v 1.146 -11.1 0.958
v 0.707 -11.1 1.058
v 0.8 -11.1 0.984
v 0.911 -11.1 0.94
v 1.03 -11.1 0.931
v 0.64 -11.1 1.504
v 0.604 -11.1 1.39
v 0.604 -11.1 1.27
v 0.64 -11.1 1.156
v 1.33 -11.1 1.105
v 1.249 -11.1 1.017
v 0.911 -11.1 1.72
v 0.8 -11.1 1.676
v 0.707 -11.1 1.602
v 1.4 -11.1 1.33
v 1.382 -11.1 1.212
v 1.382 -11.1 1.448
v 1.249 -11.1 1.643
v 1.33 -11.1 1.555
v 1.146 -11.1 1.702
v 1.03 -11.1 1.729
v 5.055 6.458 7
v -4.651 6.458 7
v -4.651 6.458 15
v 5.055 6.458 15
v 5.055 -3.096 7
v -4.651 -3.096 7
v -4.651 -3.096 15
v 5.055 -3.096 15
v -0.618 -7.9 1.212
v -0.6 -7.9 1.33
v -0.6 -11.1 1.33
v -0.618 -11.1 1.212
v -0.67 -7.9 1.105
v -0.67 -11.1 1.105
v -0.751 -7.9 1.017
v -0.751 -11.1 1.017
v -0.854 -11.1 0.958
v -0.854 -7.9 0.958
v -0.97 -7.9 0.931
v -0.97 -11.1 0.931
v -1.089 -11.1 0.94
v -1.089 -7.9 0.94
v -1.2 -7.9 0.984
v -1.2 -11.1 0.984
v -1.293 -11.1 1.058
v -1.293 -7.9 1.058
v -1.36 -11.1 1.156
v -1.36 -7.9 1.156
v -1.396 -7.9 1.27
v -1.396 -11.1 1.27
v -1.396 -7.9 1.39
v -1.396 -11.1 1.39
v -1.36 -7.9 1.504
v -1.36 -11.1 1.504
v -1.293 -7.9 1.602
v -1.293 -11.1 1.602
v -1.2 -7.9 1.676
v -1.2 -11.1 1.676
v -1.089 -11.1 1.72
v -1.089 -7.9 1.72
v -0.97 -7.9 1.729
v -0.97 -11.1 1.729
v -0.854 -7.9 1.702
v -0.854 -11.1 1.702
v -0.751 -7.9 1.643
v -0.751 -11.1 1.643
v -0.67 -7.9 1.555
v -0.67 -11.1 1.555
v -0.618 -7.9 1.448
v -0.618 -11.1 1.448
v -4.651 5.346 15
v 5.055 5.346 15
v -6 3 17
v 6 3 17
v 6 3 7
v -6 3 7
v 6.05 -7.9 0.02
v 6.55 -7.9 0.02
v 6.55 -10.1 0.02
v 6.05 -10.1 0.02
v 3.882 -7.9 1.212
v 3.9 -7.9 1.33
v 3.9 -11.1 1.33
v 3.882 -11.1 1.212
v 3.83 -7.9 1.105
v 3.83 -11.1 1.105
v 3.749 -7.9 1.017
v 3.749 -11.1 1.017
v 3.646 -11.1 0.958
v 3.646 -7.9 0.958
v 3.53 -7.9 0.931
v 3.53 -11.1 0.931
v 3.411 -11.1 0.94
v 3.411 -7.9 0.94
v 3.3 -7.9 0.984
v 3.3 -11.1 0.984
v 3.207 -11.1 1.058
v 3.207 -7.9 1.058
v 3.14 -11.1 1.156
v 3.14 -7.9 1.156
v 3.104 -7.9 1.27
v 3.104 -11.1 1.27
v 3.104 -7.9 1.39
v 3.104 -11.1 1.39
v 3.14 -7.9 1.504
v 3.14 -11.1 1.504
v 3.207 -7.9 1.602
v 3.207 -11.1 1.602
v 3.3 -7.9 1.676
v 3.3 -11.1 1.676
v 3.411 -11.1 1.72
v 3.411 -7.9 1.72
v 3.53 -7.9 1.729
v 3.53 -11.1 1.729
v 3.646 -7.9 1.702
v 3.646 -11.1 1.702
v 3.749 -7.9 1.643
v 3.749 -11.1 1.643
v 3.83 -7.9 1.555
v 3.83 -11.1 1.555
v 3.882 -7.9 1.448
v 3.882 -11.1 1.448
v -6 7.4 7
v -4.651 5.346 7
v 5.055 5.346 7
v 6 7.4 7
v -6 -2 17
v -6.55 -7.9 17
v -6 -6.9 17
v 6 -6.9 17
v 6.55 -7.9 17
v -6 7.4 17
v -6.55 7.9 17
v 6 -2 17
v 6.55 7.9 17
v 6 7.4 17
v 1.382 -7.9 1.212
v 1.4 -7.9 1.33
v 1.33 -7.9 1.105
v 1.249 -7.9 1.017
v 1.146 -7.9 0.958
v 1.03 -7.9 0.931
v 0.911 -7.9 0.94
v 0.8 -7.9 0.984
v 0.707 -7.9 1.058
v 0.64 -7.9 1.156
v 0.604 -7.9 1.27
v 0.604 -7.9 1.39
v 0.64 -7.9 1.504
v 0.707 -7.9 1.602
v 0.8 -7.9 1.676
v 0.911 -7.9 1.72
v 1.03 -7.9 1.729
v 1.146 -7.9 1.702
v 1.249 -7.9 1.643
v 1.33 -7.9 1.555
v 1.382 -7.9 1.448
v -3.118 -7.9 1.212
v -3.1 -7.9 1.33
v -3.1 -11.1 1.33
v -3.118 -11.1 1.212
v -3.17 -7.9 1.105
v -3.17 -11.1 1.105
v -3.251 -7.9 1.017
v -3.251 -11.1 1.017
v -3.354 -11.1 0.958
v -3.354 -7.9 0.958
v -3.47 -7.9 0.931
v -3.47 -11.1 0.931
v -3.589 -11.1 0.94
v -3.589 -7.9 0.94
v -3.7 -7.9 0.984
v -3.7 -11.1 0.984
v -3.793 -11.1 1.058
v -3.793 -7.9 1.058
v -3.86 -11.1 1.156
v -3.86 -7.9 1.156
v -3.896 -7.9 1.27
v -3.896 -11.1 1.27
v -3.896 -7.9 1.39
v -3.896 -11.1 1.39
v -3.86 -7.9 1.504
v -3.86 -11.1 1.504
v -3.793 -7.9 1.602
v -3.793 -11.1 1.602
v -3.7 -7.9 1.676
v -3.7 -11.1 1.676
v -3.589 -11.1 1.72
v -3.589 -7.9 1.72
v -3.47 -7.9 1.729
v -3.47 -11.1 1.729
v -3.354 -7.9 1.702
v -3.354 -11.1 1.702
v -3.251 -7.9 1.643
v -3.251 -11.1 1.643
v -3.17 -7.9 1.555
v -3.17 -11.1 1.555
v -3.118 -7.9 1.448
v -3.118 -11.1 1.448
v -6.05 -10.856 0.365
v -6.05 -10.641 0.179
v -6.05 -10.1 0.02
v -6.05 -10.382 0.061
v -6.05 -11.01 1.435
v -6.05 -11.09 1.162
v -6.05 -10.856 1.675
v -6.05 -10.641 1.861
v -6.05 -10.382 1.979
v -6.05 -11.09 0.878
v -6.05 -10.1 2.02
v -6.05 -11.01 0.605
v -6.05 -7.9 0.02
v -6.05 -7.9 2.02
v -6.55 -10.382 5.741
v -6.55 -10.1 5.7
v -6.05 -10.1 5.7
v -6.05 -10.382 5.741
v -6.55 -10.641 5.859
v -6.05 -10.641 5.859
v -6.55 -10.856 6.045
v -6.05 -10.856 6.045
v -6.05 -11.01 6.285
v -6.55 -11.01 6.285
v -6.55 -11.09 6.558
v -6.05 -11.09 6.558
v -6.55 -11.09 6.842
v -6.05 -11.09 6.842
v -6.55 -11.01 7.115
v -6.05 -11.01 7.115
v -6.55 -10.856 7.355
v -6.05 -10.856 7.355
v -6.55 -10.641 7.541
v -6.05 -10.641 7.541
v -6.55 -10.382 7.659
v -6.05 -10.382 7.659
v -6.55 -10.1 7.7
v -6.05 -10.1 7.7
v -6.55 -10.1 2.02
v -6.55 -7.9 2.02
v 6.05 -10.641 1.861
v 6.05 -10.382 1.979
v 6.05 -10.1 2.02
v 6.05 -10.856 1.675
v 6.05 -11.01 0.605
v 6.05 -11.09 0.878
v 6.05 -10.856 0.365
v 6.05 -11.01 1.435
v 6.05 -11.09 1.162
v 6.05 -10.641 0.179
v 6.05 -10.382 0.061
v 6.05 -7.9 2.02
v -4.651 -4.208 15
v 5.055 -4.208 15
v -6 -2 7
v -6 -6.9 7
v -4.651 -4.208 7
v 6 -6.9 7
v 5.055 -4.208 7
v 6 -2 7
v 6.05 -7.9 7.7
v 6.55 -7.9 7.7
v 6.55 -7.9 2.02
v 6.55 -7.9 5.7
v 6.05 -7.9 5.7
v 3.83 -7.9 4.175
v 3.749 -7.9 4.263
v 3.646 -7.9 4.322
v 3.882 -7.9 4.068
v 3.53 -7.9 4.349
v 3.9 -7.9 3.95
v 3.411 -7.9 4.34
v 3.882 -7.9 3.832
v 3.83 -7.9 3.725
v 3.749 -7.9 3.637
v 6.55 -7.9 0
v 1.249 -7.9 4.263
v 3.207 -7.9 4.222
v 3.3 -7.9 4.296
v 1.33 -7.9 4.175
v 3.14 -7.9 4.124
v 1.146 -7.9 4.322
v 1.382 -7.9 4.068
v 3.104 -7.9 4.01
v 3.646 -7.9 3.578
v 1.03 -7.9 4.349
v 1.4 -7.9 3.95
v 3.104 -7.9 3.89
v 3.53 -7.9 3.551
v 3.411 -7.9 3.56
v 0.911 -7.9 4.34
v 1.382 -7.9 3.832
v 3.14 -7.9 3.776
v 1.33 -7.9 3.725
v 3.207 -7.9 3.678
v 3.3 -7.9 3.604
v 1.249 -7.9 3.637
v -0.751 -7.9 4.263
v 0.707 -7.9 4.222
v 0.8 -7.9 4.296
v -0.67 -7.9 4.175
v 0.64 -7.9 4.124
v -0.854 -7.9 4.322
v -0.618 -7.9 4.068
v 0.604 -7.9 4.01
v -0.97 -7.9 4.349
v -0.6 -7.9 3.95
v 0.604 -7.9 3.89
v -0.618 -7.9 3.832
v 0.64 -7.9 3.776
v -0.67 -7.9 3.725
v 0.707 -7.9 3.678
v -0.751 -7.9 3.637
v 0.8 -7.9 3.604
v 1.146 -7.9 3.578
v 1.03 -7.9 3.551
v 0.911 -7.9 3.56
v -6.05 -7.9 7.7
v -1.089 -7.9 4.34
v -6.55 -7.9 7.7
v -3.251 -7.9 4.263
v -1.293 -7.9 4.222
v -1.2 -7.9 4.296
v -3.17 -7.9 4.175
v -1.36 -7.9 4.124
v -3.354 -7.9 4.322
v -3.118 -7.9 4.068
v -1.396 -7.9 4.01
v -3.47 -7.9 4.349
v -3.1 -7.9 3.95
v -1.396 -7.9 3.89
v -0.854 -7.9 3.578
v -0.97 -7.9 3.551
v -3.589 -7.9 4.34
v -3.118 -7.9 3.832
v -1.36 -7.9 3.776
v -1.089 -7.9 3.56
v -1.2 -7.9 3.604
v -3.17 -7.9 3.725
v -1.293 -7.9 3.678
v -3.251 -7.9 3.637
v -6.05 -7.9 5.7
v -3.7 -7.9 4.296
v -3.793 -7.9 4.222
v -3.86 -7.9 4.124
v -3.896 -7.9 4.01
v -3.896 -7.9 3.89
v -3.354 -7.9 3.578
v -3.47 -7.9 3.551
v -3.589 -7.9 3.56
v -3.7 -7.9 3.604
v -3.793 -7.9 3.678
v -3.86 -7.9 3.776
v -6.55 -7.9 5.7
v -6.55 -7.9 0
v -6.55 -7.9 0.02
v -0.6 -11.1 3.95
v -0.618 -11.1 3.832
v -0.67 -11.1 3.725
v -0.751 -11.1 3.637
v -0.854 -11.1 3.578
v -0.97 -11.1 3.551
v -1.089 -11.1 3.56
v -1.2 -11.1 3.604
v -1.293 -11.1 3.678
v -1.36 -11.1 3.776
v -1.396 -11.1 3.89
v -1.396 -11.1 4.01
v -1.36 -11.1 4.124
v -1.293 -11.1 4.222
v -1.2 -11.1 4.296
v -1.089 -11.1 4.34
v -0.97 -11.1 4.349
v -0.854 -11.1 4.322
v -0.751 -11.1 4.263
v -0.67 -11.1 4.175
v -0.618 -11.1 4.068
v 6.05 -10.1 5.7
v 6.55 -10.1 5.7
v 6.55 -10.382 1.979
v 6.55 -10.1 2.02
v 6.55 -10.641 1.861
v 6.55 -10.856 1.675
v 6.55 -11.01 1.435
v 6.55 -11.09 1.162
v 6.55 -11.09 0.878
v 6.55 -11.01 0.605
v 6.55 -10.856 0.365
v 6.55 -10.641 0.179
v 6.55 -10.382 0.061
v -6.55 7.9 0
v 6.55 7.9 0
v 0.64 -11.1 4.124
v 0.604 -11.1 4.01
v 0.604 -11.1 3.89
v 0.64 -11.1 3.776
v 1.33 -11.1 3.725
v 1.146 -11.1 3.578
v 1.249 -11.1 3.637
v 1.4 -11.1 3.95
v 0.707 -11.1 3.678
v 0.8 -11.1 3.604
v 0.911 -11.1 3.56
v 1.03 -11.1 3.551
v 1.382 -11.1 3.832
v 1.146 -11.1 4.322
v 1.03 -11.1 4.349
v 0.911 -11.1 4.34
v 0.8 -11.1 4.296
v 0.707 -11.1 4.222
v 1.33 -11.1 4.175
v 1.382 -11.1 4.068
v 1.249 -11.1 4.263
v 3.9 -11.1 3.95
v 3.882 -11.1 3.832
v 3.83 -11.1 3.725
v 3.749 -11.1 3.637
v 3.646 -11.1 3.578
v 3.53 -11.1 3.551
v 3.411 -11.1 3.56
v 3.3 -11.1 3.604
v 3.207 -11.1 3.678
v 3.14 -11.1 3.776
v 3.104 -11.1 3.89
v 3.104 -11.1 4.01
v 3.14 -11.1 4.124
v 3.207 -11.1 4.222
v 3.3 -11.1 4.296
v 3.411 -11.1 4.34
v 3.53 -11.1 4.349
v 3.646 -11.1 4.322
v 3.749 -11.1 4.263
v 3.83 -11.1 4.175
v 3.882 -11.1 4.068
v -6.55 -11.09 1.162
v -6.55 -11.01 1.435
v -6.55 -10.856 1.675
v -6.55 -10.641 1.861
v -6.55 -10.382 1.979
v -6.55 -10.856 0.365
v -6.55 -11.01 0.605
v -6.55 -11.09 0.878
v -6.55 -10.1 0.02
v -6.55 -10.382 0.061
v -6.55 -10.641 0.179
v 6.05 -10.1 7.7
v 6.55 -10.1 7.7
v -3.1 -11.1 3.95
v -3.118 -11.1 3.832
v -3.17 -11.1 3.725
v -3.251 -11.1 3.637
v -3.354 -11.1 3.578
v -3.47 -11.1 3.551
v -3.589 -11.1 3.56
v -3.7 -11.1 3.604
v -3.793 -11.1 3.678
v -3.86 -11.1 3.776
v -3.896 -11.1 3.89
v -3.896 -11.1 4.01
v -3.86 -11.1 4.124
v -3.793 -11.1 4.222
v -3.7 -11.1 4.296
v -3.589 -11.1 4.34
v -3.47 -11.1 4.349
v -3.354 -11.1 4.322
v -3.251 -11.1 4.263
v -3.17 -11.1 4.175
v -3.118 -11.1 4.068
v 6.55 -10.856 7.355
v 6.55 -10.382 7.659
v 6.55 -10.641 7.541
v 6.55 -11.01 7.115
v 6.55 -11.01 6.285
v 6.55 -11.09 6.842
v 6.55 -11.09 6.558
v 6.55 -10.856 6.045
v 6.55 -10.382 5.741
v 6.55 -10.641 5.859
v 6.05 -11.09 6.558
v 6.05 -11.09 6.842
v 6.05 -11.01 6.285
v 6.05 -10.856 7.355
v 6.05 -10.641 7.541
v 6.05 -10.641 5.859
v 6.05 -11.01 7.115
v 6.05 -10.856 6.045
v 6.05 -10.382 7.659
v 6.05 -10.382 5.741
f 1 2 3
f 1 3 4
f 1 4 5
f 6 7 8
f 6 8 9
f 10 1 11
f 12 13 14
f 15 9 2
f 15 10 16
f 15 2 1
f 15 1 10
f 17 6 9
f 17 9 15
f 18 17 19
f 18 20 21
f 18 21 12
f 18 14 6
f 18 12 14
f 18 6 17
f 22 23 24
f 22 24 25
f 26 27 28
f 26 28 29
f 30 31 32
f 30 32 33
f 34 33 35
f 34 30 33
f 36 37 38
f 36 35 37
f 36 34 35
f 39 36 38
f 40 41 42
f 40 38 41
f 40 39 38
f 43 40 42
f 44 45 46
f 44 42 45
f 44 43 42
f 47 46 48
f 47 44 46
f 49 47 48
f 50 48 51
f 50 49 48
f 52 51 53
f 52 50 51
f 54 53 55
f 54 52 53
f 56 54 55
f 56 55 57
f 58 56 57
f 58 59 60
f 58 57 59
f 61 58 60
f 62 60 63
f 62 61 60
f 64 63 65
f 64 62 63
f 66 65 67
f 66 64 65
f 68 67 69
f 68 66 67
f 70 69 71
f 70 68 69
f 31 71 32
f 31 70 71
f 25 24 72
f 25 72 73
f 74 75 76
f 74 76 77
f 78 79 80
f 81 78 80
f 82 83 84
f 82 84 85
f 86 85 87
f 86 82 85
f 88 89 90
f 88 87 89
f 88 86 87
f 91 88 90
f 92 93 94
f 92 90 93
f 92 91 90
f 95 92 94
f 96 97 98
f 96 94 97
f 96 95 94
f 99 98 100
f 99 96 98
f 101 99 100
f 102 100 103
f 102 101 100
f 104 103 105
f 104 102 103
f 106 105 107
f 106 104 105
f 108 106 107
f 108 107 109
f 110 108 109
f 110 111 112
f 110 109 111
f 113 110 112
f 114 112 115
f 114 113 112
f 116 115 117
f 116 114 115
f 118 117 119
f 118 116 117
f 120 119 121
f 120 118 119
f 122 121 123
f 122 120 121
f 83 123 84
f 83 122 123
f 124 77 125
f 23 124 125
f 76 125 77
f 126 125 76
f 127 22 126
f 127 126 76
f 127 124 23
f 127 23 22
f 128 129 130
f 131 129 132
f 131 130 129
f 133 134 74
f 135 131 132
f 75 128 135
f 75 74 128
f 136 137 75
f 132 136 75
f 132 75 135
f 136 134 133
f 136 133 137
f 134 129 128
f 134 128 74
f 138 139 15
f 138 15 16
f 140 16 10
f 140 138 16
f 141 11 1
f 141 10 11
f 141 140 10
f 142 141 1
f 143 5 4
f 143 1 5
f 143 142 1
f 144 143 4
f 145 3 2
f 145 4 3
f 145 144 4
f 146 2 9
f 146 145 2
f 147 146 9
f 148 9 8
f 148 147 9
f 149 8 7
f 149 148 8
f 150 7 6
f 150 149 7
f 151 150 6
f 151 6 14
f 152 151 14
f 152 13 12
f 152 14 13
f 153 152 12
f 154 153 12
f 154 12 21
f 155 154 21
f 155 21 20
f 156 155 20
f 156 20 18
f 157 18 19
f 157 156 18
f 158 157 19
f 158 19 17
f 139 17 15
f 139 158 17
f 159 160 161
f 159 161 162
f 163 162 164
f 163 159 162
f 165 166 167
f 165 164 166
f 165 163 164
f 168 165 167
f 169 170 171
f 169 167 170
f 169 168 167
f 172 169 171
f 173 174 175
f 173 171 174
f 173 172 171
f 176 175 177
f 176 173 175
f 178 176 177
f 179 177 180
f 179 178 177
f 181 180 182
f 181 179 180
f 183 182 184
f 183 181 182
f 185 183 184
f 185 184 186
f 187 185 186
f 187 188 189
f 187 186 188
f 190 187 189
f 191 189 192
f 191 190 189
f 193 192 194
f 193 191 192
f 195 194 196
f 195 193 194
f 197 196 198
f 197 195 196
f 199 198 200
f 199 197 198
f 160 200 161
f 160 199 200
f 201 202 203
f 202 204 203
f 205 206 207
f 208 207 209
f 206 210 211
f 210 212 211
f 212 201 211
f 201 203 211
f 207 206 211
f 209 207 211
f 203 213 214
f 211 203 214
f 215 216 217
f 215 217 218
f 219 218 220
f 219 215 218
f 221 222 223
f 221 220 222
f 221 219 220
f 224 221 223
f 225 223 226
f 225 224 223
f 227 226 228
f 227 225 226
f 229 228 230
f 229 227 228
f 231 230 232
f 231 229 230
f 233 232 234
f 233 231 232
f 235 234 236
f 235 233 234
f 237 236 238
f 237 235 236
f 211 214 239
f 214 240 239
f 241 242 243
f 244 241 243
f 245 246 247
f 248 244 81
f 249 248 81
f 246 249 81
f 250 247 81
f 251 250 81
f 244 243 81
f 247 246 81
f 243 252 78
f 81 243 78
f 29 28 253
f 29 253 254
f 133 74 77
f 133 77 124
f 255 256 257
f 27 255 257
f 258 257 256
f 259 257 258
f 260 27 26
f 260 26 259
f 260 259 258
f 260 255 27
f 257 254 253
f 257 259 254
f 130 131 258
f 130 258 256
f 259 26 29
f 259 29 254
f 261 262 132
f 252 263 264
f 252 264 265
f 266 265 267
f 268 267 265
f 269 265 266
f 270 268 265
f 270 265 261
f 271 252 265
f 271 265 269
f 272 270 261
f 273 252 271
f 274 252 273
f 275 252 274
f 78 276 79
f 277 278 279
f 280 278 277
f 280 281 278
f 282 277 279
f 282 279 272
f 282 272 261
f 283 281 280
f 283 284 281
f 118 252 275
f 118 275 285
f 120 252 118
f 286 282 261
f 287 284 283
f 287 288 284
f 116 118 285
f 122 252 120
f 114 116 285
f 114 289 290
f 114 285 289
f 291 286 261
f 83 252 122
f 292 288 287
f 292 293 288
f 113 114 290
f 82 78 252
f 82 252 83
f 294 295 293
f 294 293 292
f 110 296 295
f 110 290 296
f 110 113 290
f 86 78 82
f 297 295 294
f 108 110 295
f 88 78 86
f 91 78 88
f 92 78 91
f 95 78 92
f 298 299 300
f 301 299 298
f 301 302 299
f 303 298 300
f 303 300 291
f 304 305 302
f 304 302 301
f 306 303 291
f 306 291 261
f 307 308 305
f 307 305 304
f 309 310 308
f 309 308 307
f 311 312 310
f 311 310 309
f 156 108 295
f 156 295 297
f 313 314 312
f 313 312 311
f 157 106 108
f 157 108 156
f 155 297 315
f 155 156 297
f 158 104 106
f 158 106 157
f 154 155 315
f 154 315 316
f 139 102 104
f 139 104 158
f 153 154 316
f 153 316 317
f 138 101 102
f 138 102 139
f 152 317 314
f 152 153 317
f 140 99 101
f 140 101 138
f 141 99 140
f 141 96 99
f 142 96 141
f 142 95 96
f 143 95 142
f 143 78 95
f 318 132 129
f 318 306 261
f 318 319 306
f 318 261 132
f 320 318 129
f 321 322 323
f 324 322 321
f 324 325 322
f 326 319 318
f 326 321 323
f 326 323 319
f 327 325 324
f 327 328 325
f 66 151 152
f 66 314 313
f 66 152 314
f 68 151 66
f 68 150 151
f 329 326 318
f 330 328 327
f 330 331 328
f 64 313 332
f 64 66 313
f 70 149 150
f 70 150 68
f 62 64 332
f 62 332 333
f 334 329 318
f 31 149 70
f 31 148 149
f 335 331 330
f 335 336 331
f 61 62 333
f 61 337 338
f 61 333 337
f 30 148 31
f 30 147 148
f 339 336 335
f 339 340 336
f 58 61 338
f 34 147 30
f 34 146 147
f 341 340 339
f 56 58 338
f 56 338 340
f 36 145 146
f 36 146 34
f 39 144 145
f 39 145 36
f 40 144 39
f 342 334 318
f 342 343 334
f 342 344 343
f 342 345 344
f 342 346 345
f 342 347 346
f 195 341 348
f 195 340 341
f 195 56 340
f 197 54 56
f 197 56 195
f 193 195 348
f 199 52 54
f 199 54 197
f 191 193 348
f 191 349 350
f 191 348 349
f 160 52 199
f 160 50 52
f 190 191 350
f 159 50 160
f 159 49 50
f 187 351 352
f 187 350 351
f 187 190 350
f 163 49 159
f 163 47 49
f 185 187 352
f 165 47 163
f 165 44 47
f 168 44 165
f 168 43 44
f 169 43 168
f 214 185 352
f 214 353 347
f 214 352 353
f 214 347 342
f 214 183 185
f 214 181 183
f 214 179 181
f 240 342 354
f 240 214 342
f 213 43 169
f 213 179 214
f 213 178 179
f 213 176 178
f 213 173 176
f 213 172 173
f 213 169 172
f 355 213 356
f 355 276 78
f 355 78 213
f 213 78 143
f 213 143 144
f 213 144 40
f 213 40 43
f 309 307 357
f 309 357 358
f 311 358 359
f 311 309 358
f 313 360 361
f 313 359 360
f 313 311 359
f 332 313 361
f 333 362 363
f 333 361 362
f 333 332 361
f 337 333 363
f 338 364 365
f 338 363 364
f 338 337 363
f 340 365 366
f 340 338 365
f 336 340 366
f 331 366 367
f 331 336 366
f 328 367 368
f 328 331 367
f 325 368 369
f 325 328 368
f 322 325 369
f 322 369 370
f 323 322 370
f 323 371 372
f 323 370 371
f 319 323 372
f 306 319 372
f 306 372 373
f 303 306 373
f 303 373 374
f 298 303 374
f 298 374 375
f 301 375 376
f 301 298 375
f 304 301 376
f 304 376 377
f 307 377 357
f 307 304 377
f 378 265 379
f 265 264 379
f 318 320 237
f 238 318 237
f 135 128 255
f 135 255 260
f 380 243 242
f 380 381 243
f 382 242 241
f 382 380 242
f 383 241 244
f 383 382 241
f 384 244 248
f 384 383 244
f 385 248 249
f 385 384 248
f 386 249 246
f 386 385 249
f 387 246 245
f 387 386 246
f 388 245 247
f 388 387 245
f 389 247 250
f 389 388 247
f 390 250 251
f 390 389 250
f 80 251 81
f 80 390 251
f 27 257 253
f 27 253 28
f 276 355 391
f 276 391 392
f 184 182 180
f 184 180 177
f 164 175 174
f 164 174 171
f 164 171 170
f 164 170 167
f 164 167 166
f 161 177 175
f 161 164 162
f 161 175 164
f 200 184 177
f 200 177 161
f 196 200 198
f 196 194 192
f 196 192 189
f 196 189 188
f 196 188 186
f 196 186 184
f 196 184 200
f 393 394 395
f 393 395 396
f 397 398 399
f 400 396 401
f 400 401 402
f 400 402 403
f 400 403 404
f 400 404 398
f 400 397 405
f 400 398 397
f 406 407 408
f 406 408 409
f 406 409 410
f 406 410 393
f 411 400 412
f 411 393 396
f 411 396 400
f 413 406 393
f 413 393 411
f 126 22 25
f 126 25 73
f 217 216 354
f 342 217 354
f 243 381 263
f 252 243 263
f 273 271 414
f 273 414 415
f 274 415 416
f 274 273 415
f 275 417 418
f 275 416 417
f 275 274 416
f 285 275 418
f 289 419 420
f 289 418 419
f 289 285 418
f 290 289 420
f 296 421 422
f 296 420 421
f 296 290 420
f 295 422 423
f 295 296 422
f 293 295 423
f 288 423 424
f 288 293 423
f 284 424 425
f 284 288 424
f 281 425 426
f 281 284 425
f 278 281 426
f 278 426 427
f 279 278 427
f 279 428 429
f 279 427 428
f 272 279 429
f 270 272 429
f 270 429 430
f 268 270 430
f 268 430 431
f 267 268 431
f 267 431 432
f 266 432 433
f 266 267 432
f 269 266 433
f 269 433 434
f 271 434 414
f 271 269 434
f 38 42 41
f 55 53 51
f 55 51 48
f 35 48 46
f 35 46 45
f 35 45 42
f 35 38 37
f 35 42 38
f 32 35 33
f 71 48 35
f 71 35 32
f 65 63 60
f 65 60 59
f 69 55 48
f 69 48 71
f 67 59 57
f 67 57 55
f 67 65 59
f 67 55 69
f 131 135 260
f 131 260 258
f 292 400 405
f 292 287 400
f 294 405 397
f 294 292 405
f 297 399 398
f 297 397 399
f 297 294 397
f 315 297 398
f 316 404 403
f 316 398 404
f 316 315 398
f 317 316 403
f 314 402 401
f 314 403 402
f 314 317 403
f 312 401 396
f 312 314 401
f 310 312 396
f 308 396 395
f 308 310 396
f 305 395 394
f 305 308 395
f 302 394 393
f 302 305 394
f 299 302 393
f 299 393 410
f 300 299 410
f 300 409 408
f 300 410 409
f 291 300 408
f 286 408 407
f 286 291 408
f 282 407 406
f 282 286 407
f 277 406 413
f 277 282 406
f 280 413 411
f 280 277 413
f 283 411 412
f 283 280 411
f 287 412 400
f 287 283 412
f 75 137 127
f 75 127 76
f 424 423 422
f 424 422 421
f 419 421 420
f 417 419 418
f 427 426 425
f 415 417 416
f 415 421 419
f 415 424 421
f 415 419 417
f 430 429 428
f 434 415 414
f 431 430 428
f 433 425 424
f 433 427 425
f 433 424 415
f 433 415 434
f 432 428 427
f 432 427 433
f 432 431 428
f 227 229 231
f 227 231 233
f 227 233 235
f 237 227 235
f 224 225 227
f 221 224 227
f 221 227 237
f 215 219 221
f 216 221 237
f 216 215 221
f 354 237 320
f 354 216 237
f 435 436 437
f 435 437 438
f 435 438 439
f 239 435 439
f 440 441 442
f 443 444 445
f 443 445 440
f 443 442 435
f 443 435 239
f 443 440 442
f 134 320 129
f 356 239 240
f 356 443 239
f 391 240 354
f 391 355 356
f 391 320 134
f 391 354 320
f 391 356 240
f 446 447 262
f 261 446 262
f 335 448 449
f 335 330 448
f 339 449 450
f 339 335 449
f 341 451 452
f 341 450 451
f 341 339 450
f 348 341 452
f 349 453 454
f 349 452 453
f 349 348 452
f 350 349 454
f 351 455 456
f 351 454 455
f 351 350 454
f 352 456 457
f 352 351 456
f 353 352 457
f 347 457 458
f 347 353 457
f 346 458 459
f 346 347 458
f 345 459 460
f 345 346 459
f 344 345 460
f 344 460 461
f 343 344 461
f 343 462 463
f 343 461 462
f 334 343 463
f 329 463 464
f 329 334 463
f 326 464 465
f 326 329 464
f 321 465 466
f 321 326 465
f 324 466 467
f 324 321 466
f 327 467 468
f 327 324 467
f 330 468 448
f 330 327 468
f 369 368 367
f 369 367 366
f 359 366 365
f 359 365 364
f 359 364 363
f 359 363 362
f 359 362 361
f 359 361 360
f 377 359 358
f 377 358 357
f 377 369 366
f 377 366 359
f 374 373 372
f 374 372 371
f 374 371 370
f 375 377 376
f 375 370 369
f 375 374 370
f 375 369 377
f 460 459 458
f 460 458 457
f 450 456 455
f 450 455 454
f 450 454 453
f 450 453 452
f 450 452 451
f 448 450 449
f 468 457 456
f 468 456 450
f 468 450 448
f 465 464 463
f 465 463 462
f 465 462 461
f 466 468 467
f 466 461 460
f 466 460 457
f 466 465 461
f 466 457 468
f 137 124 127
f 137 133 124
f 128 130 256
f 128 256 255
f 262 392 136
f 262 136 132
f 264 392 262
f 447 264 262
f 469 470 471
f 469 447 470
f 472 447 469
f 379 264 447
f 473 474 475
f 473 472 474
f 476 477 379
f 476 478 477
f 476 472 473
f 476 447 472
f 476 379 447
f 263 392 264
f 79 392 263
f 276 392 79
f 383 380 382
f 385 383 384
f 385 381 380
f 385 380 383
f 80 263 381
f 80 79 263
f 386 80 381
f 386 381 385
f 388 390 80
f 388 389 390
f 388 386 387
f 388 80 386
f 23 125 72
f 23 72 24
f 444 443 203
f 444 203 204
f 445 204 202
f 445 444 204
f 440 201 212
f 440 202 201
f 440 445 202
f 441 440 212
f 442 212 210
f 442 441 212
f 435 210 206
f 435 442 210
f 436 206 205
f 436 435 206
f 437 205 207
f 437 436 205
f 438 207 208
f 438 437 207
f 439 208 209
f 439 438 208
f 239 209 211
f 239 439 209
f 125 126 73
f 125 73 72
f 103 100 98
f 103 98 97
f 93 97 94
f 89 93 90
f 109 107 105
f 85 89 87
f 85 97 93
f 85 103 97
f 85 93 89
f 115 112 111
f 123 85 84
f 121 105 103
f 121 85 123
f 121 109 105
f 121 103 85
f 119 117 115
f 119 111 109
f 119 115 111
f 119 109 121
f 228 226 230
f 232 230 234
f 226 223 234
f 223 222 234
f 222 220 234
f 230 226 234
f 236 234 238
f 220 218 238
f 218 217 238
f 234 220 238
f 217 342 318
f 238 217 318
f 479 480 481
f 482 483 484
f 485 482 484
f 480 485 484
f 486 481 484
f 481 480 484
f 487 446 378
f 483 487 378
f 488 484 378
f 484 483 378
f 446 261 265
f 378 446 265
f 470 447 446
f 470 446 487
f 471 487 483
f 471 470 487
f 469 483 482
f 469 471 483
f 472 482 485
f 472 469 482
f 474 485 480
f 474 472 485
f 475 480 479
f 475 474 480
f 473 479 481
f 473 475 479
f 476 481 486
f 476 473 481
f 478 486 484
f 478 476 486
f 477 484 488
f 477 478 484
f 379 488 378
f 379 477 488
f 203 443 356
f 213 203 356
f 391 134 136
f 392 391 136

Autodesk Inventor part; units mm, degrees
ref_plane "YZ Plane" through (0, 0, 0) normal (1, 0, 0) x (0, 1, 0)
ref_plane "XZ Plane" through (0, 0, 0) normal (0, 1, 0) x (-1, 0, 0)
ref_plane "XY Plane" through (0, 0, 0) normal (0, 0, 1) x (1, 0, 0)
sketch "Sketch1" plane through (0, 0, 0) normal (0, 0, 1) x (1, 0, 0)
  line L0 (-6.55, 7.9) -> (6.55, 7.9)
  line L1 (6.55, 7.9) -> (6.55, -7.9)
  line L2 (6.55, -7.9) -> (-6.55, -7.9)
  line L3 (-6.55, -7.9) -> (-6.55, 7.9)
  point P0 (0, 0)
  dimension "d0" = 13.1
  dimension "d1" = 15.8
  dimension "d2" = 7.9
  dimension "d3" = 6.55
extrude "Extrusion1" add sketch "Sketch1" along normal blind 17
sketch "Sketch2" plane through (0, 0, 17) normal (0, 0, 1) x (1, 0, 0)
  line L0 (-6, 7.4) -> (6, 7.4)
  line L1 (6, 7.4) -> (6, 3)
  line L2 (6, 3) -> (-6, 3)
  line L3 (-6, 3) -> (-6, 7.4)
  line L4 (-6, -2) -> (6, -2)
  line L5 (6, -2) -> (6, -6.9)
  line L6 (6, -6.9) -> (-6, -6.9)
  line L7 (-6, -6.9) -> (-6, -2)
  line L8 (-6.55, -7.9) -> (6.55, -7.9) projected
  line L9 (6.55, 7.9) -> (-6.55, 7.9) projected
  point P0 (0, 0)
  dimension "d6" = 12
  dimension "d7" = 12
  dimension "d8" = 6
  dimension "d9" = 1
  dimension "d10" = 0.5
  dimension "d11" = 5
  dimension "d12" = 2
extrude "Extrusion2" cut sketch "Sketch2" against normal blind 10
sketch "Sketch3" plane through (0, 0, 7) normal (0, 0, 1) x (1, 0, 0)
  line L0 (-4.6506, 6.4578) -> (5.055, 6.4578)
  line L1 (5.055, 6.4578) -> (5.055, 5.3457)
  line L2 (5.055, 5.3457) -> (-4.6506, 5.3457)
  line L3 (-4.6506, 5.3457) -> (-4.6506, 6.4578)
  line L4 (-4.6506, -3.0962) -> (5.055, -3.0962)
  line L5 (5.055, -3.0962) -> (5.055, -4.2083)
  line L6 (5.055, -4.2083) -> (-4.6506, -4.2083)
  line L7 (-4.6506, -4.2083) -> (-4.6506, -3.0962)
  point P0 (0, 0)
extrude "Extrusion3" add sketch "Sketch3" along normal blind 8
sketch "Sketch4" plane through (6.55, -7.9, 0) normal (1, 0, 0) x (0, 0, -1)
  line L0 (-7.7, 2.838) -> (-5.7, 2.838)
  line L1 (-5.7, 2.838) -> (-5.7, -3.2)
  line L2 (-5.7, -3.2) -> (-7.7, -3.2)
  line L3 (-7.7, -3.2) -> (-7.7, 2.838)
  line L4 (-17, 0) -> (-17, 15.8) projected
  line L5 (-2.02, 6.1684) -> (-0.02, 6.1684)
  line L6 (-0.02, 6.1684) -> (-0.02, -3.2)
  line L7 (-0.02, -3.2) -> (-2.02, -3.2)
  line L8 (-2.02, -3.2) -> (-2.02, 6.1684)
  arc A0 (-7.7, -2.2) -> (-5.7, -2.2) centre (-6.7, -2.2) ccw
  arc A1 (-2.02, -2.2) -> (-0.02, -2.2) centre (-1.02, -2.2) ccw
  point P0 (0, 7.9)
  dimension "d17" = 2
  dimension "d18" = 9.3
  dimension "d19" = 2
  dimension "d20" = 3.68
  dimension "d21" = 3.2
  dimension "d22" = 0
extrude "Extrusion4" add sketch "Sketch4" against normal blind 0.5 contours L0 L1 A0 L3 | L5 L6 A1 L8
sketch "Sketch5" plane through (-6.55, -7.9, 0) normal (0, -1, 0) x (1, 0, 0)
  line L0 (13.8244, 1.33) -> (1.8735, 1.33) construction
  line L1 (13.8244, 3.95) -> (1.8735, 3.95) construction
  line L2 (13.1, 7.7) -> (12.6, 7.7) projected
  circle A0 centre (5.55, 1.33) radius 0.4
  circle A1 centre (5.55, 3.95) radius 0.4
  circle A2 centre (7.55, 1.33) radius 0.4
  circle A3 centre (7.55, 3.95) radius 0.4
  circle A4 centre (3.05, 1.33) radius 0.4
  circle A5 centre (3.05, 3.95) radius 0.4
  circle A6 centre (10.05, 3.95) radius 0.4
  circle A7 centre (10.05, 1.33) radius 0.4
  point P0 (6.55, 0)
  dimension "d25" = 2.62
  dimension "d26" = 3.75
  dimension "d27" = 2
  dimension "d28" = 1
  dimension "d29" = 2
  dimension "d30" = 1
  dimension "d31" = 2.5
  dimension "d32" = 2.5
  dimension "d33" = 2.5
  dimension "d34" = 2.5
  dimension "d35" = 0.8
  dimension "d36" = 0.8
  dimension "d37" = 0.8
  dimension "d38" = 0.8
  dimension "d39" = 0.8
  dimension "d40" = 0.8
  dimension "d41" = 0.8
  dimension "d42" = 0.8
extrude "Extrusion5" add sketch "Sketch5" along normal blind 3.2
mirror "Mirror1" about plane through (0, 0, 0) normal (1, 0, 0) of "Extrusion4"
properties part number "USBA_Stack"
